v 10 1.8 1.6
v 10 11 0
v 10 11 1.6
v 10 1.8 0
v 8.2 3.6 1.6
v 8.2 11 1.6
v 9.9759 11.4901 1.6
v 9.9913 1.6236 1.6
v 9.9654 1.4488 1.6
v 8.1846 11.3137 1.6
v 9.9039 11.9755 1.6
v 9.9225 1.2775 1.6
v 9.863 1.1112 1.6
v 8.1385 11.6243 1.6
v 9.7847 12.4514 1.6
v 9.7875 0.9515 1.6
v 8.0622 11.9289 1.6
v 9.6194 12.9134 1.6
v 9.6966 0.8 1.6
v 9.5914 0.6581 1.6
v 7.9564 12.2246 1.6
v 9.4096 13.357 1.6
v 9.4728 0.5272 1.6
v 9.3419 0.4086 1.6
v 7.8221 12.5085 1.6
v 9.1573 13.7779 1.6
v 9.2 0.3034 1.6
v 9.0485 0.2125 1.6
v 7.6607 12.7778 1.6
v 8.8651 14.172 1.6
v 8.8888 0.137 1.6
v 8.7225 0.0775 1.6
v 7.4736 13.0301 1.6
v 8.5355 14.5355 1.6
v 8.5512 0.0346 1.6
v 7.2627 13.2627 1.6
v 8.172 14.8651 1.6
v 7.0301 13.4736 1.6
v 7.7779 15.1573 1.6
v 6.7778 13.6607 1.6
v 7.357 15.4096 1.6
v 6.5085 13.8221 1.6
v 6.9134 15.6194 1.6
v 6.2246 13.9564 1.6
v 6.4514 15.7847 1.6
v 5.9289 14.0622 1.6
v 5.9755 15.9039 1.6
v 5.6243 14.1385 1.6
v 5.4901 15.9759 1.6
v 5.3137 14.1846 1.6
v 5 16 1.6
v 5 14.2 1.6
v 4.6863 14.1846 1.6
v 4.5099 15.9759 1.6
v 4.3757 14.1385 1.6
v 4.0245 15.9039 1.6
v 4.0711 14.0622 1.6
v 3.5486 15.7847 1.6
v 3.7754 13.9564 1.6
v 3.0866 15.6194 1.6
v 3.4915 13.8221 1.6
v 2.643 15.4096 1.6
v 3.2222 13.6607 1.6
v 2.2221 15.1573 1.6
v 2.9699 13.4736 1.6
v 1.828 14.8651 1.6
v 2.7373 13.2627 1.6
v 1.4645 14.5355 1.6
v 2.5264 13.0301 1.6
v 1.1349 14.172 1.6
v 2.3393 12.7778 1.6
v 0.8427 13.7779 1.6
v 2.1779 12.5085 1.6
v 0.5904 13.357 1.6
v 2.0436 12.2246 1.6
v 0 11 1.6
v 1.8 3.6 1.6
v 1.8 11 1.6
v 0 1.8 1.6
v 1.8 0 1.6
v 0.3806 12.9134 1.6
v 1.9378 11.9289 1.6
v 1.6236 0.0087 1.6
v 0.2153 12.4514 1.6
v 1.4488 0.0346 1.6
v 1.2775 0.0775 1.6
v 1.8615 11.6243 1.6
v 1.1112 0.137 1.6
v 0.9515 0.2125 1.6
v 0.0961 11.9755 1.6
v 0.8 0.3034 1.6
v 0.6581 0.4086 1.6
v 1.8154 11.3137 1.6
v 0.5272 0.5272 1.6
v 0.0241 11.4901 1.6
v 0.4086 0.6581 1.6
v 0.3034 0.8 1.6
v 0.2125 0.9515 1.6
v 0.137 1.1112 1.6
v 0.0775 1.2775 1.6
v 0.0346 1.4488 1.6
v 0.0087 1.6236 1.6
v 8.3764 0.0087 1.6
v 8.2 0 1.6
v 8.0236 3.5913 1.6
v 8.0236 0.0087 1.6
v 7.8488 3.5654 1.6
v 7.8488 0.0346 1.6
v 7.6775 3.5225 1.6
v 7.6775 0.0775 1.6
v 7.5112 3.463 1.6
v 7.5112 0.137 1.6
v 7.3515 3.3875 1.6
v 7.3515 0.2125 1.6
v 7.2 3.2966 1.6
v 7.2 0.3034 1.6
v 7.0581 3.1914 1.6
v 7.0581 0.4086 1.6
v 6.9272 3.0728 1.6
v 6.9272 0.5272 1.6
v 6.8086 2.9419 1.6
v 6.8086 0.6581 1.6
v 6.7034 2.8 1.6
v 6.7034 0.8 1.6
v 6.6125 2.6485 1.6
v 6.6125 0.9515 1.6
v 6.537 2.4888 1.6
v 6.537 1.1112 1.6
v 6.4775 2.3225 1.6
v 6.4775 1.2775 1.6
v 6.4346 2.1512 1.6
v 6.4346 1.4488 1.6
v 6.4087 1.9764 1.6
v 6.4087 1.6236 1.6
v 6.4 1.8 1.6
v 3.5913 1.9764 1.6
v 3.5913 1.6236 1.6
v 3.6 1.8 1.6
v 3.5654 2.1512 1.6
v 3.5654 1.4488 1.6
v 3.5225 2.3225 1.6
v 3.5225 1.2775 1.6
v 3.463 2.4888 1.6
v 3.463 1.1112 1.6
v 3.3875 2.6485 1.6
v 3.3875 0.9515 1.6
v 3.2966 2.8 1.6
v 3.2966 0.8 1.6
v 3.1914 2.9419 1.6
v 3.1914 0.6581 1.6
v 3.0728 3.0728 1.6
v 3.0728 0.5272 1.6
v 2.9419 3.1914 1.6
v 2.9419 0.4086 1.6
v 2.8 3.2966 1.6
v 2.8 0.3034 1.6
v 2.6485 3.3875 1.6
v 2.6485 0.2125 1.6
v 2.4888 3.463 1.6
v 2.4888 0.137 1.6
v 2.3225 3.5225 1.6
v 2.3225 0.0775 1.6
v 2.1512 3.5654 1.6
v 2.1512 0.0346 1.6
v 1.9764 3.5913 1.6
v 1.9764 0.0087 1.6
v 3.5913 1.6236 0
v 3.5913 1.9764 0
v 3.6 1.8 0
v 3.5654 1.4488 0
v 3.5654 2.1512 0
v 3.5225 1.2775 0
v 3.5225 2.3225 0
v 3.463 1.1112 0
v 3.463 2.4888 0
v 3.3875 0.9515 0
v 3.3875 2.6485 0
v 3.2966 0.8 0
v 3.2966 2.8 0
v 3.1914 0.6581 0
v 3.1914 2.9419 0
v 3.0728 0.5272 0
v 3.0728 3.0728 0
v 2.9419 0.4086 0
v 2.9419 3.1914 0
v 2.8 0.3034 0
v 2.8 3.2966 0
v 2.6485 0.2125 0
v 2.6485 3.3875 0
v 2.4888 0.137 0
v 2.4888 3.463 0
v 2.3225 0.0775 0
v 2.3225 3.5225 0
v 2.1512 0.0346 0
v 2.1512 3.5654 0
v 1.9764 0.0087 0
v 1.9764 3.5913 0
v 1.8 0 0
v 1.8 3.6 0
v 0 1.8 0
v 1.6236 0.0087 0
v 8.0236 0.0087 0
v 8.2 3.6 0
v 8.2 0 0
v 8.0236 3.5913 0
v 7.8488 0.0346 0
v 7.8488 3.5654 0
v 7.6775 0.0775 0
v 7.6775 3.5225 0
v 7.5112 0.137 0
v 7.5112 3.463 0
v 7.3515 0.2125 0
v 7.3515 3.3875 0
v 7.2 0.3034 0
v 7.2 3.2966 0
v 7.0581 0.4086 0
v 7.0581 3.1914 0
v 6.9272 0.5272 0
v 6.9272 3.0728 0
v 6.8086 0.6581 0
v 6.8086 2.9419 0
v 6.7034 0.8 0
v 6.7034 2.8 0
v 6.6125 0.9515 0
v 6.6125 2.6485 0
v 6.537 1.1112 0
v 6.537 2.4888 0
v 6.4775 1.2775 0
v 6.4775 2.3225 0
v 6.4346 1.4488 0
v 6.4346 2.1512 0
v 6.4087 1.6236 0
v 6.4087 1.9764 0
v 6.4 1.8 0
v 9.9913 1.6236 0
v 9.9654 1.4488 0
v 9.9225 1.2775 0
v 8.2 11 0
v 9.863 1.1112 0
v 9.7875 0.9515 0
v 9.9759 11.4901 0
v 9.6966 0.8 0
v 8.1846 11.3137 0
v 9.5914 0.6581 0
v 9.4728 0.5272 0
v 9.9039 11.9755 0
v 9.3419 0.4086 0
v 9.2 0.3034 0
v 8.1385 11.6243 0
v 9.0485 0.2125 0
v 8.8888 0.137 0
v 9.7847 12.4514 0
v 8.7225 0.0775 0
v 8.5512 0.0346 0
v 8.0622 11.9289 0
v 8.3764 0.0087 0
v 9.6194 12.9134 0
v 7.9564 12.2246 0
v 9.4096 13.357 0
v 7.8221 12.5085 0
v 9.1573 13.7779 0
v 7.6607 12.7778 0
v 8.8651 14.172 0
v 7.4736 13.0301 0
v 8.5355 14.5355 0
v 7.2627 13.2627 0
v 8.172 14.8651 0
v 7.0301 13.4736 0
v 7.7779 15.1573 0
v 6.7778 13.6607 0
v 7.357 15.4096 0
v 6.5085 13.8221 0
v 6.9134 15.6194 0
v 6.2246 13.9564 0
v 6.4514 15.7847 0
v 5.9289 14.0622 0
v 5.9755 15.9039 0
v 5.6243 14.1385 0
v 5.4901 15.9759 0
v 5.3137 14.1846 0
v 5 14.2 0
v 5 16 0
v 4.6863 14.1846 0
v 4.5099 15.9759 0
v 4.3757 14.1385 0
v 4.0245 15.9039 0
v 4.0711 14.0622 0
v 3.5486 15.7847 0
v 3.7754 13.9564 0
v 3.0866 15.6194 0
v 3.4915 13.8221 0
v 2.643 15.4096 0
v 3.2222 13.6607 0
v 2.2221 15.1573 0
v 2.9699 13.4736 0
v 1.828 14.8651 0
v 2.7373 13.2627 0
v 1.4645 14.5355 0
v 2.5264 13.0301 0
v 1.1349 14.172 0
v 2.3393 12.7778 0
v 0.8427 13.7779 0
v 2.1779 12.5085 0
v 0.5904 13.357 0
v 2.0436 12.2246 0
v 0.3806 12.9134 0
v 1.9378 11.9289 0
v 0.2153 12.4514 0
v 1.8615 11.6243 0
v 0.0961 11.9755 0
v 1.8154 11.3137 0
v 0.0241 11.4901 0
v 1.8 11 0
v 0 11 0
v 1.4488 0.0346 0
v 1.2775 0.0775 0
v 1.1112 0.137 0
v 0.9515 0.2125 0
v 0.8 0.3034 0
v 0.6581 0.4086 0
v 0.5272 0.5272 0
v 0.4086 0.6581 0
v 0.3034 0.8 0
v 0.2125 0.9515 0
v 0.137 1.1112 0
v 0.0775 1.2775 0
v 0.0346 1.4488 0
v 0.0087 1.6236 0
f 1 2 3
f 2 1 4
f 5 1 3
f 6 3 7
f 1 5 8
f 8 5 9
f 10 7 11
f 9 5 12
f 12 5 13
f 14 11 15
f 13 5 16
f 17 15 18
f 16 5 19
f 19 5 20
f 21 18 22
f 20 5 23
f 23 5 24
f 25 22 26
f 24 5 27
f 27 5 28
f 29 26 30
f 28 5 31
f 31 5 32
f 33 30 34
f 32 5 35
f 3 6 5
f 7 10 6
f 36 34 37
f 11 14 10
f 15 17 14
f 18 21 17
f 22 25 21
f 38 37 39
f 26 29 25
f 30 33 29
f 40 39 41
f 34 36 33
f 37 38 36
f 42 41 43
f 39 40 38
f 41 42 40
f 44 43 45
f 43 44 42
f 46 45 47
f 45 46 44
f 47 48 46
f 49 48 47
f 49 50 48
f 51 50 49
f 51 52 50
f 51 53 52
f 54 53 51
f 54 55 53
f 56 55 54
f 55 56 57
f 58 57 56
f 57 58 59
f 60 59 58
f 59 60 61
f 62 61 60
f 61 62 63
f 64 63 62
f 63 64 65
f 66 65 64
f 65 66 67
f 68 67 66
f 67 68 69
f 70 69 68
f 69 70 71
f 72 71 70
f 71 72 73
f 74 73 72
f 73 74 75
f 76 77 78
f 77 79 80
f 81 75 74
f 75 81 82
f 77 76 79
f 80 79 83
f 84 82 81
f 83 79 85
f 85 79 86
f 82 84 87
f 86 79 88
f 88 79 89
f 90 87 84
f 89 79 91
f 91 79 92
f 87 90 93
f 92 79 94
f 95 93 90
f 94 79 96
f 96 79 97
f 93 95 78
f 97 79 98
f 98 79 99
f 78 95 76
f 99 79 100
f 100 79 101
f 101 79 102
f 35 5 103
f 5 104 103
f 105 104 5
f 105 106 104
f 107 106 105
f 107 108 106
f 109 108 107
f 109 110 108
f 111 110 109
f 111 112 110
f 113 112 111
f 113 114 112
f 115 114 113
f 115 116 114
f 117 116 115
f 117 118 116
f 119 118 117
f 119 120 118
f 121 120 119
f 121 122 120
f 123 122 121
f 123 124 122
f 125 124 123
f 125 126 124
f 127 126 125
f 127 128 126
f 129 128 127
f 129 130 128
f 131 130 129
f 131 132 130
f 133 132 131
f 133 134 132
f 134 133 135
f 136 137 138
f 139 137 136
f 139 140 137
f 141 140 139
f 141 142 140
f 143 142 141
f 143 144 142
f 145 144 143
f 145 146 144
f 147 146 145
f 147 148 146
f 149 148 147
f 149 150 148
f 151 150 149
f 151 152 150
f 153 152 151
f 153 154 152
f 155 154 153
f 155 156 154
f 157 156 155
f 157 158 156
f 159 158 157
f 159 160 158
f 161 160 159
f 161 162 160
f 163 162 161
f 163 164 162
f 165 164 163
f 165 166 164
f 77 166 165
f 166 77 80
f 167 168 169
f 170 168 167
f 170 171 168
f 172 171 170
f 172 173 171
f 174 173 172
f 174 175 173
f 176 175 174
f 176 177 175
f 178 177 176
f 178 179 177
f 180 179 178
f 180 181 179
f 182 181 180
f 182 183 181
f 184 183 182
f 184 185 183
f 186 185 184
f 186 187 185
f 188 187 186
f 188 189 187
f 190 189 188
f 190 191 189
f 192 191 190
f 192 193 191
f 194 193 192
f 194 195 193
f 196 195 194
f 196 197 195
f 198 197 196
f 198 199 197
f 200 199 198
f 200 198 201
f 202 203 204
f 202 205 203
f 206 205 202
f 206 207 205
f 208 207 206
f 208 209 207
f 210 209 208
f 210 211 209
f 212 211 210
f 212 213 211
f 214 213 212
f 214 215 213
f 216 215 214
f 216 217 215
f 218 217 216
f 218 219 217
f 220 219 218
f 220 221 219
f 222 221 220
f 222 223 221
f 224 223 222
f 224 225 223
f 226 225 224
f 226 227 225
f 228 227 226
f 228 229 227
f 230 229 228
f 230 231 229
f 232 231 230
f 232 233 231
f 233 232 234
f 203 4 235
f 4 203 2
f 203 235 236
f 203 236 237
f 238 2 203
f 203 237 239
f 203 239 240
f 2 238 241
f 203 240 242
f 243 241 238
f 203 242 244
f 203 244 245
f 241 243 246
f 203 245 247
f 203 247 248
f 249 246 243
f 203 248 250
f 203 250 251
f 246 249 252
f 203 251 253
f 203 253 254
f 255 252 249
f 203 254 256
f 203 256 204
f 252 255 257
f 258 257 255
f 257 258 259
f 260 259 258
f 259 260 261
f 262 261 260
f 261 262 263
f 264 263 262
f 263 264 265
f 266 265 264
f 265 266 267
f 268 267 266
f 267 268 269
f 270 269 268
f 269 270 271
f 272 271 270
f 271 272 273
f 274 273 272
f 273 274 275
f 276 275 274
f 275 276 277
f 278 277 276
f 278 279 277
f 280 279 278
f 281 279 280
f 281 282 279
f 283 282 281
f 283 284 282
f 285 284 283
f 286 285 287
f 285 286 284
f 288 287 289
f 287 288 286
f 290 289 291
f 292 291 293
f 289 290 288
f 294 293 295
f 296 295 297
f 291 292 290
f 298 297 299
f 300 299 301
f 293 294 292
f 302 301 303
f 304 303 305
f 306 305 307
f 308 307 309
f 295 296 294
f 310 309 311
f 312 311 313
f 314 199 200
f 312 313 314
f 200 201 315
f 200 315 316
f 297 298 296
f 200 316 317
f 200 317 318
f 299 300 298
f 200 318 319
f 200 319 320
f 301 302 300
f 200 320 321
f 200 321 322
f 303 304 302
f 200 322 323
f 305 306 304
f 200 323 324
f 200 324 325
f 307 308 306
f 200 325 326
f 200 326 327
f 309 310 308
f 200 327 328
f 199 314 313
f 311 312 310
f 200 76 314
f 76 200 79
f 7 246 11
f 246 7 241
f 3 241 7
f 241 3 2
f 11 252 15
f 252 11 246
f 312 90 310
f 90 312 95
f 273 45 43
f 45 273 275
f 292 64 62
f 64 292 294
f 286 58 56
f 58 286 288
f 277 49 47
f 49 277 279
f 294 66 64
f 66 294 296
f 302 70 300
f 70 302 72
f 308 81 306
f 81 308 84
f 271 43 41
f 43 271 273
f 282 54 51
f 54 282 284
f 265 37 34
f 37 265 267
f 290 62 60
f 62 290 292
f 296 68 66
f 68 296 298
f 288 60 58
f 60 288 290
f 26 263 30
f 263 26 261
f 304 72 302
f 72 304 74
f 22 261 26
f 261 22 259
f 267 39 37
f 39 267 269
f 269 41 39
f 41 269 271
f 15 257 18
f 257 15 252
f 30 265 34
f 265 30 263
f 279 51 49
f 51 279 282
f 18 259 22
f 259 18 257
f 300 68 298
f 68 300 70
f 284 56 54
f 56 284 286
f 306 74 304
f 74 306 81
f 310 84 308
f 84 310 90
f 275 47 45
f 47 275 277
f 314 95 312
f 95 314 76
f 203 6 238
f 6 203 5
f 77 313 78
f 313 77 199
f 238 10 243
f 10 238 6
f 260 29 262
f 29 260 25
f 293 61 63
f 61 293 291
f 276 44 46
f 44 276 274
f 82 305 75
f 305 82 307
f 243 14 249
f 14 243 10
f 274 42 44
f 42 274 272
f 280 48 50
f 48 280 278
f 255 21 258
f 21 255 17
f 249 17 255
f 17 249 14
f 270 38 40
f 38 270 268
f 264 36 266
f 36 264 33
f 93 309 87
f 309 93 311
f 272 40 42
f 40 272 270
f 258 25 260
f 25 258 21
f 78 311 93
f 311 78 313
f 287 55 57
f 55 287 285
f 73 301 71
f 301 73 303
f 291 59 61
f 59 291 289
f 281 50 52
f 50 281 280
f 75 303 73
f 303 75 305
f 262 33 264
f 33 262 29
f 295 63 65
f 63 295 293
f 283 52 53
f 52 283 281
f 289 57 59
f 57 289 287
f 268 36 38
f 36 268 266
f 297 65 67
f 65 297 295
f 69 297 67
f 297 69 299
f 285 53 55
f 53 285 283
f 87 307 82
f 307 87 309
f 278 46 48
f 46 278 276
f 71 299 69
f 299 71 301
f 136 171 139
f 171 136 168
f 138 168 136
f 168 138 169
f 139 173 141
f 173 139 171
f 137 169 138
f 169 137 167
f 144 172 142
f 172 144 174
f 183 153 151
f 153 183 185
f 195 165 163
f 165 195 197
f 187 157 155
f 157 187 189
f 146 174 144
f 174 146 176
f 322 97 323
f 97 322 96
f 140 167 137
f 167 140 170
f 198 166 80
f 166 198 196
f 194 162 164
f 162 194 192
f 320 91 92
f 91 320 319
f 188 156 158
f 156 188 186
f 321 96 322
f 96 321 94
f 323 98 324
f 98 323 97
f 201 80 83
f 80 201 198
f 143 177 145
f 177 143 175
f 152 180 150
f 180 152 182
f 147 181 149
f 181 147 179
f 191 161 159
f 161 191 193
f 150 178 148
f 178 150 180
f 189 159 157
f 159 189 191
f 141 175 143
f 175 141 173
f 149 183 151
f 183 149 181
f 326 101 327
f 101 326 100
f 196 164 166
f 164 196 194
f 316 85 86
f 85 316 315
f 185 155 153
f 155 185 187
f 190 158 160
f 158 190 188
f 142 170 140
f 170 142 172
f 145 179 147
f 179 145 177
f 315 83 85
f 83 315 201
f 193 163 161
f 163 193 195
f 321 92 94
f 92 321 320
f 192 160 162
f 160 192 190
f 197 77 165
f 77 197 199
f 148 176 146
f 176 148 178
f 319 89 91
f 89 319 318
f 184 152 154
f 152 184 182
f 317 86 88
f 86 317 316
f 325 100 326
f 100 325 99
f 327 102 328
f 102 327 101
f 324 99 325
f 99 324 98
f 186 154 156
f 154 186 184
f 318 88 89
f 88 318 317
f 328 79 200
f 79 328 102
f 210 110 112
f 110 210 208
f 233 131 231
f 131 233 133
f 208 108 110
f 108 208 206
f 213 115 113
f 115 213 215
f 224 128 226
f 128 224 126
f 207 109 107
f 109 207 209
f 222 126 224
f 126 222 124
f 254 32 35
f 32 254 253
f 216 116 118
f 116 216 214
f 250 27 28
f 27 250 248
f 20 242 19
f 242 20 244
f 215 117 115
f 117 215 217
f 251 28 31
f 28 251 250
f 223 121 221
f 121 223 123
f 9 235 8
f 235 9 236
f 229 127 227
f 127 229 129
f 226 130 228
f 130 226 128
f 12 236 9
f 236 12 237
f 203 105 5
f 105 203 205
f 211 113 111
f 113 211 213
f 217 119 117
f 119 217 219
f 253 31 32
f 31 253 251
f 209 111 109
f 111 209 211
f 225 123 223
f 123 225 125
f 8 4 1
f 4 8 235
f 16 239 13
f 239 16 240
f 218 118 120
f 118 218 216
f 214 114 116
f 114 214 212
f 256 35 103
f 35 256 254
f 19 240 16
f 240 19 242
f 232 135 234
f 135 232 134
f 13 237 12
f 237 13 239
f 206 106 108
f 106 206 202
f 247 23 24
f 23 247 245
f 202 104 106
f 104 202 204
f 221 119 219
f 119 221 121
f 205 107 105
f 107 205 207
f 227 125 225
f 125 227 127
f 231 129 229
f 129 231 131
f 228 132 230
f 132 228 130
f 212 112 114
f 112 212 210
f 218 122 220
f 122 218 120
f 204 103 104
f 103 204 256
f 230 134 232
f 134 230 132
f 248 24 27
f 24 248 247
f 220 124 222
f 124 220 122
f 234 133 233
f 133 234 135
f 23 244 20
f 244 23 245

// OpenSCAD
// see variables.png

Length = 16;
Width  = 10;
Girth  = 1.8;
Bump   = 3.6;

Height = 1.6; // <-- z dimension: not shown in pic

StitchMarker(Length, Width, Height, Girth, Bump);

module StitchMarker(length, width, height, girth, bump)
{
    radius = width/2;

    difference()
    {
        union()
        {
            translate([0, bump/2, 0]) 
                cube(size=[width, length-radius-bump/2, height], center=false);
            
            translate([width/2,length-radius,0])
                cylinder(r=radius, h=height, center=false, $fn=64);
        }

        union()
        {
            translate([girth, 0, 0]) 
                cube(size=[width-2*girth, length-radius, height], center=false);

            translate([width/2,length-radius,0])
                cylinder(r=radius-girth, h=height, center=false, $fn=64);
        }
    }

    // bumps
    translate([bump/2, bump/2, 0])
        cylinder(r=bump/2, h=height, center=false, $fn=64);

    translate([width-bump/2, bump/2, 0])
        cylinder(r=bump/2, h=height, center=false, $fn=64);
}
